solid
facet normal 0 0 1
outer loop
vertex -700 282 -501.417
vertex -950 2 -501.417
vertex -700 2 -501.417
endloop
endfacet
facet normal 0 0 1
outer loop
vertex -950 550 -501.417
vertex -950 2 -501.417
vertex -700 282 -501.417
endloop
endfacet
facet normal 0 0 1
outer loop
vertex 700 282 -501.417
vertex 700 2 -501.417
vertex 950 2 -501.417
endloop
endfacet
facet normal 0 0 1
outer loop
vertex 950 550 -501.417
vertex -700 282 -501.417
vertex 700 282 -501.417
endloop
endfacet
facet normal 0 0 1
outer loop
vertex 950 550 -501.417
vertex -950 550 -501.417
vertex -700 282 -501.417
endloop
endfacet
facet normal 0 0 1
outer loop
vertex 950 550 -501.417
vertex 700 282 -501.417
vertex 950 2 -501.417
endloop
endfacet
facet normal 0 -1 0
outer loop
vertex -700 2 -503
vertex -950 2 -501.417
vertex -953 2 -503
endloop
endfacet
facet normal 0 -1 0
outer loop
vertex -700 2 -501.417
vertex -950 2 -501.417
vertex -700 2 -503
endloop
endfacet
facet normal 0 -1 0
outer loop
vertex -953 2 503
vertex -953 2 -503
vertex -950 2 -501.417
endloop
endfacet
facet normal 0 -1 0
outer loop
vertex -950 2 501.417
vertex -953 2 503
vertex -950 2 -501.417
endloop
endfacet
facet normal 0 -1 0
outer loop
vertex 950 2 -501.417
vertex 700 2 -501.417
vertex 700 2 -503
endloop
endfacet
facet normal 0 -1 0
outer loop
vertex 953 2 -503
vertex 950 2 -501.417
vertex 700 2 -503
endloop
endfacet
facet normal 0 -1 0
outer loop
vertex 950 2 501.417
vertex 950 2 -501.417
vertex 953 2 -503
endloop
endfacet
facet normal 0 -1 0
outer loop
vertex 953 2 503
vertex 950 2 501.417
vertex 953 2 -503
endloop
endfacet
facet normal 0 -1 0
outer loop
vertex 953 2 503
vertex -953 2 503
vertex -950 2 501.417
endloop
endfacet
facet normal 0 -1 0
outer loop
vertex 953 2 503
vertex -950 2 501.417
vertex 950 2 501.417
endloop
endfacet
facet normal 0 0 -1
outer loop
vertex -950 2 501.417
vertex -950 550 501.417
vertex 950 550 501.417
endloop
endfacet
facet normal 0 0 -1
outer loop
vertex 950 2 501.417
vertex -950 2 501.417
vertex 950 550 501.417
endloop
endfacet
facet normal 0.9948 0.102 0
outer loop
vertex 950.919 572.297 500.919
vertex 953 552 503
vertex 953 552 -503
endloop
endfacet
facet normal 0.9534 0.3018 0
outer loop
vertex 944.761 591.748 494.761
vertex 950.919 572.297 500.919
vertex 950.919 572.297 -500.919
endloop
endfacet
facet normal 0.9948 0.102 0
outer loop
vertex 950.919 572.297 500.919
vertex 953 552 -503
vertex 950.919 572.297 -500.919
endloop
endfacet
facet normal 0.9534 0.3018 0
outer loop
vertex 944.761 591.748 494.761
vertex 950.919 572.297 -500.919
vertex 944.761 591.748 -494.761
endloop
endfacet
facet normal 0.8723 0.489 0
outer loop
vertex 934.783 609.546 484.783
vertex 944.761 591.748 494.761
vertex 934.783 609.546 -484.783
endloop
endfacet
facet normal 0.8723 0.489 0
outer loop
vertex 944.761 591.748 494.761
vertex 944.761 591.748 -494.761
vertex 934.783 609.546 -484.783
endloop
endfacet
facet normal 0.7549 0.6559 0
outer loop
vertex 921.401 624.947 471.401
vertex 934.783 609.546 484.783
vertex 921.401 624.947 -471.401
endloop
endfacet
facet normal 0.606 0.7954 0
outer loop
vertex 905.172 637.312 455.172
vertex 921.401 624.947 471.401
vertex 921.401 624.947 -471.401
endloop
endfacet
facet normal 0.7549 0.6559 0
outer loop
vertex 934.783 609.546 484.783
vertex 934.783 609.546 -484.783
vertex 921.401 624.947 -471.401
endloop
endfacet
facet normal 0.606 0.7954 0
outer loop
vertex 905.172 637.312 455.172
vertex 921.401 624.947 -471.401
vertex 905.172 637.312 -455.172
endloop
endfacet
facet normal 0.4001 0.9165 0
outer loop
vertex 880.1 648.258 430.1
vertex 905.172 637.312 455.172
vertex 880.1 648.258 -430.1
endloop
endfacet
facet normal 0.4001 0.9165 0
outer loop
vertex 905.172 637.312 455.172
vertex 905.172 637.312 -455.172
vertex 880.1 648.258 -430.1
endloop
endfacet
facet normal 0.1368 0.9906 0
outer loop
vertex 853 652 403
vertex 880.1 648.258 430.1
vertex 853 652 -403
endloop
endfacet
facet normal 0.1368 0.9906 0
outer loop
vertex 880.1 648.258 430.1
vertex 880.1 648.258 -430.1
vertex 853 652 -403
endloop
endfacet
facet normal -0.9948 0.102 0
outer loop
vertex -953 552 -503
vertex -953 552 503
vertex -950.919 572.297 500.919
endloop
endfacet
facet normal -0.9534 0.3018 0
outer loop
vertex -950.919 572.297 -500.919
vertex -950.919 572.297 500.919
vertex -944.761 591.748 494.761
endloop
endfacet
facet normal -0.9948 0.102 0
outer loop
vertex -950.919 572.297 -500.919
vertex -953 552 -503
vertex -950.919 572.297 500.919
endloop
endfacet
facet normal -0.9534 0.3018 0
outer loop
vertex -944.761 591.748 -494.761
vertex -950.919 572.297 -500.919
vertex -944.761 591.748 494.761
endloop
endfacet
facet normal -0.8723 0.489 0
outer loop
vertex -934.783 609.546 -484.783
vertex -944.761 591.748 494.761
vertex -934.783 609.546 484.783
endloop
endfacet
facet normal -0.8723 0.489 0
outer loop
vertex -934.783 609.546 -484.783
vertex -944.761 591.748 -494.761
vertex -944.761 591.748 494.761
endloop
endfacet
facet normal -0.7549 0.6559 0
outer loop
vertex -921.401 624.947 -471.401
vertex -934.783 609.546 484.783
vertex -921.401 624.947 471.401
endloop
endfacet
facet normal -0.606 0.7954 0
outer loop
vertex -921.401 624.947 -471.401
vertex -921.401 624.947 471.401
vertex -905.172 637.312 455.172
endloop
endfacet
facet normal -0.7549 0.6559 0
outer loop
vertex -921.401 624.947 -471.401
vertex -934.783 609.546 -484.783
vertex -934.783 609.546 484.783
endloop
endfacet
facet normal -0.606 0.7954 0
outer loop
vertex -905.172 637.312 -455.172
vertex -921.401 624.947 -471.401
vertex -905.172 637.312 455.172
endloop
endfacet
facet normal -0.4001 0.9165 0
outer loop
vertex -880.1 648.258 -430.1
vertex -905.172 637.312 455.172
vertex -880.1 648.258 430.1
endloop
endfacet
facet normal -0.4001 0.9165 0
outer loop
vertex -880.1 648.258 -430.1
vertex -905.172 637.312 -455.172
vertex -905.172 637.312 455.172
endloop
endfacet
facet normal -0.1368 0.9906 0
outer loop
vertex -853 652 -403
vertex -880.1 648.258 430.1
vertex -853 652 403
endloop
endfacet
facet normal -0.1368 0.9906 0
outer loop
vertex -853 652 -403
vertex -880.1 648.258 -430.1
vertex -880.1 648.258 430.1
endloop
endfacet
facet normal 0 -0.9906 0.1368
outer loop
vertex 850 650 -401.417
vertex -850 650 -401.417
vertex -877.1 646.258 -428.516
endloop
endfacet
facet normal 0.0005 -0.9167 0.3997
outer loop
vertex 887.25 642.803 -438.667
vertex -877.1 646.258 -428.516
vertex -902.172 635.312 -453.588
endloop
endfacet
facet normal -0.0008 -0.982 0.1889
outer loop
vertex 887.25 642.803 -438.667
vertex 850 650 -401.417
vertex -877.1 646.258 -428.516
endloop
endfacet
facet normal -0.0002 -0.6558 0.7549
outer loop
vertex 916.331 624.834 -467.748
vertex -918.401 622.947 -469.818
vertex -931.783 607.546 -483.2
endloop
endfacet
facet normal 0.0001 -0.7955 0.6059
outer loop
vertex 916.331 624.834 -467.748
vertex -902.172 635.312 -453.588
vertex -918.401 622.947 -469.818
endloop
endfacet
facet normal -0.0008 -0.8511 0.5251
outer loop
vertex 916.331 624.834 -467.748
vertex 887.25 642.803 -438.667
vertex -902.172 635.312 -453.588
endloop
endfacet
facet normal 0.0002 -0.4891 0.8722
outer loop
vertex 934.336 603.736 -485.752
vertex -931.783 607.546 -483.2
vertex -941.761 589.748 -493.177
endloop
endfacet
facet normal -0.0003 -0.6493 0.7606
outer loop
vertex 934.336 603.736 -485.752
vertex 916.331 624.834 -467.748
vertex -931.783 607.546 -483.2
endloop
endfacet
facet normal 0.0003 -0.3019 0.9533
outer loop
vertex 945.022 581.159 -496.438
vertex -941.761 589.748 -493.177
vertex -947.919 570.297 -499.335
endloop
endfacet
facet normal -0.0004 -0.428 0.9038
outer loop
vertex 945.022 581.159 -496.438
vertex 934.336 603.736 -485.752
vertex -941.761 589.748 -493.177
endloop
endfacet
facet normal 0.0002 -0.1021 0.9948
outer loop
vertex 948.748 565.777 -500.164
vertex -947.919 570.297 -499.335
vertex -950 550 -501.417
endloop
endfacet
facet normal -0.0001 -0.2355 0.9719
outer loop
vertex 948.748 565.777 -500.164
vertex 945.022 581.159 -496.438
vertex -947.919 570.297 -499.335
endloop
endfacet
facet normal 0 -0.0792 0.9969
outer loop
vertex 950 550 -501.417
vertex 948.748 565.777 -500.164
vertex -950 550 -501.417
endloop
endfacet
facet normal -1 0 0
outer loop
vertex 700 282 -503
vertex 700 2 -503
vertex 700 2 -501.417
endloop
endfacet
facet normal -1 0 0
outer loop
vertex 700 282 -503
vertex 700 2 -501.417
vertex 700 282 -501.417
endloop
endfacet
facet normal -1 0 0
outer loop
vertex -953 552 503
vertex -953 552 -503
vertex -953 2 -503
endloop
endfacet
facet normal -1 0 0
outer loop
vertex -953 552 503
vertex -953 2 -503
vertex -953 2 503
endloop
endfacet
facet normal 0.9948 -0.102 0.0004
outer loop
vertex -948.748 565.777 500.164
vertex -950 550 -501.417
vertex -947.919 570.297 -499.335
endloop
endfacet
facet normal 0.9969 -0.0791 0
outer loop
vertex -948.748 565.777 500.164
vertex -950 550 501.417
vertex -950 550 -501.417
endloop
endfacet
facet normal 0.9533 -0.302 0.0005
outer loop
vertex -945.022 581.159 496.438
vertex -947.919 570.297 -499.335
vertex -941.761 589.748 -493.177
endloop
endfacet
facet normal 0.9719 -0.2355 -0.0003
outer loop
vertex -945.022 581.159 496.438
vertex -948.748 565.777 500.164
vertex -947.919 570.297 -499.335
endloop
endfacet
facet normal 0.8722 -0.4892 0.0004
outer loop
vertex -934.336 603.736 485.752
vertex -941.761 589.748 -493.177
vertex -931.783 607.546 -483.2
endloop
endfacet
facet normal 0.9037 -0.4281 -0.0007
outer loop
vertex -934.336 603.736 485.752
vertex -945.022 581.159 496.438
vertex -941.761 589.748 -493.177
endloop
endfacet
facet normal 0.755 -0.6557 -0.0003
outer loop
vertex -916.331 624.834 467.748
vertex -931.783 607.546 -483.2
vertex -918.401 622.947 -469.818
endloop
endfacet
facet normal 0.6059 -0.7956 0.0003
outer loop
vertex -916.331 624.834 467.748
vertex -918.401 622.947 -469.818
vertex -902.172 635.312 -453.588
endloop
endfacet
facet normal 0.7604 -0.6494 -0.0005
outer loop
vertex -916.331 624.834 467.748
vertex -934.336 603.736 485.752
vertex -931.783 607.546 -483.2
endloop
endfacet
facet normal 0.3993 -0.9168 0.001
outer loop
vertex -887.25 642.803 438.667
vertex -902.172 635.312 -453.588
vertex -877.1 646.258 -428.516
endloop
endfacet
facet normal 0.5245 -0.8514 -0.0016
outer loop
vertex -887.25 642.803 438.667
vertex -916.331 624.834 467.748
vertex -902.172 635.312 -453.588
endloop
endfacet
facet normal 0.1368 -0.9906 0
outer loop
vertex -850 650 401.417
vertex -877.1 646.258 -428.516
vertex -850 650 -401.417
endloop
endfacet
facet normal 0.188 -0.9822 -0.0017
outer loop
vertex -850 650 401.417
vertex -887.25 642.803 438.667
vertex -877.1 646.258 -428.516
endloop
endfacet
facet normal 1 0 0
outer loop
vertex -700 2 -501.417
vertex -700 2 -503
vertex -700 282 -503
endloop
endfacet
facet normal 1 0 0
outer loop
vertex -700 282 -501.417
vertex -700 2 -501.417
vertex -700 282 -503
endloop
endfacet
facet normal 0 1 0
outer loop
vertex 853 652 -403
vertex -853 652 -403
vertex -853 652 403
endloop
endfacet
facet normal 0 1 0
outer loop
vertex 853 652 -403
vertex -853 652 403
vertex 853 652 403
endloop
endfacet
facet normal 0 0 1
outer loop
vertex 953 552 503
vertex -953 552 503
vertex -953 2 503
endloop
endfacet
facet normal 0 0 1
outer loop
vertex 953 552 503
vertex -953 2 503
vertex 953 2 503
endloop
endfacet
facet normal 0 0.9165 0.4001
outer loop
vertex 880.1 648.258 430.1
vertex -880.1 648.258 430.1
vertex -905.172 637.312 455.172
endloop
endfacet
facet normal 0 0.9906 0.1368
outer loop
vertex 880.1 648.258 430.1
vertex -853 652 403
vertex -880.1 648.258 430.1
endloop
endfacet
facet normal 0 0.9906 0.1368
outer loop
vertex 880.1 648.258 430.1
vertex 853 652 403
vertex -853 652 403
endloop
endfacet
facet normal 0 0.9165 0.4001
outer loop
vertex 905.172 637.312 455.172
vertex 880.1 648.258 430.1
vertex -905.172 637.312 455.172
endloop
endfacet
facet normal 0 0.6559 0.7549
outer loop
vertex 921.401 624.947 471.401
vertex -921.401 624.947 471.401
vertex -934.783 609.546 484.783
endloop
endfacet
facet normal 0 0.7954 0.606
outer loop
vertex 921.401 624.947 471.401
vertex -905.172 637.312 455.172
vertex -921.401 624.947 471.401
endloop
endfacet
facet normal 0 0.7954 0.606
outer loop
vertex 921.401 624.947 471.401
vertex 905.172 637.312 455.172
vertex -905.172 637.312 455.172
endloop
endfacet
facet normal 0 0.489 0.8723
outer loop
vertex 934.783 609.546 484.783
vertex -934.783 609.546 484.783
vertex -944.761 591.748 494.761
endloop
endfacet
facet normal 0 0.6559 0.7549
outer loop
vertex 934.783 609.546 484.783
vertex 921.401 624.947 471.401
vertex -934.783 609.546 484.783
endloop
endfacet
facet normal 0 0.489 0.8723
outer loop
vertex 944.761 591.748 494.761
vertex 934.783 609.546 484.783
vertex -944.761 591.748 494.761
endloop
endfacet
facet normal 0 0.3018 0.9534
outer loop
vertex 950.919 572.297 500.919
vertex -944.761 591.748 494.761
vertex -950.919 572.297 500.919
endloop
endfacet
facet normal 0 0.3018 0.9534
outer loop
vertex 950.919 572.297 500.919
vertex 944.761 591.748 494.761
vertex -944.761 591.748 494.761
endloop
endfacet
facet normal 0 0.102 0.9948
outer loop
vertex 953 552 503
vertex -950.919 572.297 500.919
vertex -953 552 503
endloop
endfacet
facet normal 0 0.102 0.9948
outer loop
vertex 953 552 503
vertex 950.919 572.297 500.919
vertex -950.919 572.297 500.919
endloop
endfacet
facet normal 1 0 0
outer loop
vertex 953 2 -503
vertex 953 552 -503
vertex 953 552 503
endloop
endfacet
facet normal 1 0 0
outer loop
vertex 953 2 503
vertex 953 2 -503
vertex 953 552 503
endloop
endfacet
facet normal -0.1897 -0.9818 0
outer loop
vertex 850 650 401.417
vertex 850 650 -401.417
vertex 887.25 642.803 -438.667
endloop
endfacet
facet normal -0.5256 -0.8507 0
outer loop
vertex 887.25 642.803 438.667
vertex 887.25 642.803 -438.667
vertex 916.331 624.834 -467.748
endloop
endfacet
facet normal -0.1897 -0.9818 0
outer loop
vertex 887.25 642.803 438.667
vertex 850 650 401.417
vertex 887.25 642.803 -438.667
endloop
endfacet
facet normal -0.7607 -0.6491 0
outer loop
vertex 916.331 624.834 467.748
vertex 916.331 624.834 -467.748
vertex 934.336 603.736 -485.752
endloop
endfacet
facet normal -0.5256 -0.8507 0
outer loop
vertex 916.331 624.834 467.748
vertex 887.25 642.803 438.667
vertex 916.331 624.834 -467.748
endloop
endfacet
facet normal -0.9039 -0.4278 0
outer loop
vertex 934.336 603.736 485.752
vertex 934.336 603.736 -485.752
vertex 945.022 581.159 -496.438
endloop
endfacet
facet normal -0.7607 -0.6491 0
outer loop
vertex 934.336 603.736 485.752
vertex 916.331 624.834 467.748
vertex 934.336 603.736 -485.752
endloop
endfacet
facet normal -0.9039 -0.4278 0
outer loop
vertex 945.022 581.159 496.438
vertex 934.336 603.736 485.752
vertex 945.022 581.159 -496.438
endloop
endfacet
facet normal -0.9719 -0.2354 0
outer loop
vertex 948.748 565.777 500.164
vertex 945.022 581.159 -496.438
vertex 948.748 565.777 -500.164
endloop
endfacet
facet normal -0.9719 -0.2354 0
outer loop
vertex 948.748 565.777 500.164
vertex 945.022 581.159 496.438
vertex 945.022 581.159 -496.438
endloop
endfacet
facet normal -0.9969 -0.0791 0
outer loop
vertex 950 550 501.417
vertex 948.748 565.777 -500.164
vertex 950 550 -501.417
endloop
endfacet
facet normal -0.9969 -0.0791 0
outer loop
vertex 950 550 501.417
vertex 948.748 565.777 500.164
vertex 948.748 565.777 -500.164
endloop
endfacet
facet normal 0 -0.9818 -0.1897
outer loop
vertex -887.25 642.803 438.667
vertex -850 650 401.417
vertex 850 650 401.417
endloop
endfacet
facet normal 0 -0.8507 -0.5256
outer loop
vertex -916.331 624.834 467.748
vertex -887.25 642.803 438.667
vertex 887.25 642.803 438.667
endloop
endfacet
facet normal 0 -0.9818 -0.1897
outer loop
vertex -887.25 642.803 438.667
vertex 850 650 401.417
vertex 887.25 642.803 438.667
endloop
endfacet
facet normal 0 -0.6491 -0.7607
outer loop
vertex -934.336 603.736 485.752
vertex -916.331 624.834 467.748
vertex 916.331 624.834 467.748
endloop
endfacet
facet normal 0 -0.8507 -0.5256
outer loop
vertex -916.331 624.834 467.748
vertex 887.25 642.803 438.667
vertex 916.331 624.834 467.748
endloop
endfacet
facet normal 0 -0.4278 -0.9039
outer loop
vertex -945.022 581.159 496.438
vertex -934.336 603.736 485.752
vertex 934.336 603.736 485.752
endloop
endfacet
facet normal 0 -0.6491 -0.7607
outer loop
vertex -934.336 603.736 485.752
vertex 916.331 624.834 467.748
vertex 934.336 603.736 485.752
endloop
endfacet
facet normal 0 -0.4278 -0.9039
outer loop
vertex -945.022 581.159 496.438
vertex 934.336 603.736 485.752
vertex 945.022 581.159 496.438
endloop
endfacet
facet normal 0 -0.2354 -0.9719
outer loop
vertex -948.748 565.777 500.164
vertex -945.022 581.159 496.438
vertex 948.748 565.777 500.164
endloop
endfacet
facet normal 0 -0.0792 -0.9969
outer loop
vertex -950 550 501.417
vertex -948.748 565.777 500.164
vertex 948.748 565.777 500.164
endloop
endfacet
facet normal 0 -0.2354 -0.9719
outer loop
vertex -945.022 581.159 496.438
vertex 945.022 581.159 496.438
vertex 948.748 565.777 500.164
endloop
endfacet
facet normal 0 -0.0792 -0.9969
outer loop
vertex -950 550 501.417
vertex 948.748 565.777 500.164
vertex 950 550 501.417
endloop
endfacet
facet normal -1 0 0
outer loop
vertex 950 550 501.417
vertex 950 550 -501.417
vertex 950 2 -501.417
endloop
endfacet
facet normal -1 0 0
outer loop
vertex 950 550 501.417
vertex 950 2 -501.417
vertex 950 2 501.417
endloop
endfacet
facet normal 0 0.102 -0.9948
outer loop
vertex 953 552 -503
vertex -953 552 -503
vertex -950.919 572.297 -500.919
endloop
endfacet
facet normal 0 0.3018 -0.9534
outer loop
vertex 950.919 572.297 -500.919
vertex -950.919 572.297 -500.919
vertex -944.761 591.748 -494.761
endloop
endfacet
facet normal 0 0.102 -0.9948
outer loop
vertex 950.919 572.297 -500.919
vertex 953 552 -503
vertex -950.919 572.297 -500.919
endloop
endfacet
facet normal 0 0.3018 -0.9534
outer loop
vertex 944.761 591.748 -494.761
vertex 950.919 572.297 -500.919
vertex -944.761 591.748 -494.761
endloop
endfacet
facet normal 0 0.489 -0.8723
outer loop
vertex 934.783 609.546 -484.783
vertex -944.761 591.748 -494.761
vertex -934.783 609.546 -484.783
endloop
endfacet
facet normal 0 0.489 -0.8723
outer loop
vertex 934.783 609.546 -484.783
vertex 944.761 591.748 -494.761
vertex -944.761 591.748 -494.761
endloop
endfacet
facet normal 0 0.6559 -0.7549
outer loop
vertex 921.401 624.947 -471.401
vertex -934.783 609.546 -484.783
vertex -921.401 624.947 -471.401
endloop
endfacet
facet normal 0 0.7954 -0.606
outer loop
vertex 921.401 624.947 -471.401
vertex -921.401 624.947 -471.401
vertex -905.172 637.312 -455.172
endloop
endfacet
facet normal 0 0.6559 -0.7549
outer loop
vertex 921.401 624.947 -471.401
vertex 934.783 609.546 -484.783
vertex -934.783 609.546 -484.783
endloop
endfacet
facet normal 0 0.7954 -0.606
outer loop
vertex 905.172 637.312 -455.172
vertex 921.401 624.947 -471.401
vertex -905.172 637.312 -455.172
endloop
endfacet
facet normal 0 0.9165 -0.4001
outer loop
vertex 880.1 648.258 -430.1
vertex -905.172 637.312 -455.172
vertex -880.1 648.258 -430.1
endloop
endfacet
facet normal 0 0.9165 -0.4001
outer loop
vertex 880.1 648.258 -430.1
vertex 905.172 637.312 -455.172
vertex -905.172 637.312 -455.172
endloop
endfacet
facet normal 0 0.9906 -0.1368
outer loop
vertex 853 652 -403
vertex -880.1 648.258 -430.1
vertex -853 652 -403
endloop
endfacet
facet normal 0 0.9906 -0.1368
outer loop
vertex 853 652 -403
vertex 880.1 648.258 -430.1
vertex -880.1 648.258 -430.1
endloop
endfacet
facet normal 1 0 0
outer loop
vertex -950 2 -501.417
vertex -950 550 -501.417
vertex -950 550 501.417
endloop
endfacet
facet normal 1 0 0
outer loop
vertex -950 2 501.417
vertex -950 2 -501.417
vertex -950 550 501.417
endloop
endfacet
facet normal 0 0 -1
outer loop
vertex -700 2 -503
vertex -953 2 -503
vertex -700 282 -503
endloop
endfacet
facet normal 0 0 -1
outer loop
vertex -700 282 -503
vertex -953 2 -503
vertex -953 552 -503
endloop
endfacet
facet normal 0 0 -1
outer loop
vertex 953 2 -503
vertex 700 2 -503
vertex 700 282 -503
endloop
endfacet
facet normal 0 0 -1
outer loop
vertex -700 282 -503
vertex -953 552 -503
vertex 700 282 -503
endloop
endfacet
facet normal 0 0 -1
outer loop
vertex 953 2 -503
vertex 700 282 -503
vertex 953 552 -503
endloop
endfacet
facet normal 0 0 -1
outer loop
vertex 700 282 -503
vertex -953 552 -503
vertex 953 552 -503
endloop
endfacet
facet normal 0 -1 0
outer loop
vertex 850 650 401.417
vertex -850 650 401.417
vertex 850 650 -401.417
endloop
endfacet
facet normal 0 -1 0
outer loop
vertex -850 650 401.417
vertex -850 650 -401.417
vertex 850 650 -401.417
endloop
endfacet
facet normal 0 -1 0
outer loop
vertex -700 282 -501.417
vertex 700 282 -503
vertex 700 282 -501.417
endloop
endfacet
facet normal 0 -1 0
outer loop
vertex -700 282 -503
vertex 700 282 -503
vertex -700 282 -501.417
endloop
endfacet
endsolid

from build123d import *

# Parameters (mm, degrees)
BOSS_EXTRUDE1_START = 650
SKETCH1_W           = 1906
SKETCH1_H           = 1006
BOSS_EXTRUDE1_DEPTH = 2
SKETCH2_W           = 1906
SKETCH2_H           = 1006
SKETCH2_W_2         = 1900
SKETCH2_H_2         = 1002.833158448
BOSS_EXTRUDE2_DEPTH = 648
FILLET1_R           = 100
SKETCH3_W           = 1400
SKETCH3_H           = 560
CUT_EXTRUDE1_DEPTH  = 143


with BuildPart() as part:
    # Sketch1 → Boss-Extrude1 (new body)
    with BuildSketch(Plane(origin=(0, 0, 0), x_dir=(1, 0, 0), z_dir=(0, 1, 0)).offset(BOSS_EXTRUDE1_START)):
        Rectangle(SKETCH1_W, SKETCH1_H)
    extrude(amount=BOSS_EXTRUDE1_DEPTH)

    # Sketch2 → Boss-Extrude2 (add)
    with BuildSketch(Plane.XZ.offset(-650)):
        Rectangle(SKETCH2_W, SKETCH2_H)
        Rectangle(SKETCH2_W_2, SKETCH2_H_2, mode=Mode.SUBTRACT)
    extrude(amount=BOSS_EXTRUDE2_DEPTH)

    # Fillet1
    fillet1_edges = [part.edges().sort_by_distance(p)[0] for p in [
        (953, 652, 0),
        (0, 652, -503),
        (0, 650, 501.416579224),
        (-950, 650, 0),
        (0, 650, -501.416579224),
        (950, 650, 0),
        (-953, 652, 0),
        (0, 652, 503),
    ]]
    fillet(fillet1_edges, radius=FILLET1_R)

    # Sketch3 → Cut-Extrude1 (cut)
    with BuildSketch(Plane(origin=(0, 0, -503), x_dir=(-1, 0, 0), z_dir=(0, 0, -1))):
        with Locations((0, 2)):
            Rectangle(SKETCH3_W, SKETCH3_H)
    extrude(amount=-CUT_EXTRUDE1_DEPTH, mode=Mode.SUBTRACT)


solid = part.part
